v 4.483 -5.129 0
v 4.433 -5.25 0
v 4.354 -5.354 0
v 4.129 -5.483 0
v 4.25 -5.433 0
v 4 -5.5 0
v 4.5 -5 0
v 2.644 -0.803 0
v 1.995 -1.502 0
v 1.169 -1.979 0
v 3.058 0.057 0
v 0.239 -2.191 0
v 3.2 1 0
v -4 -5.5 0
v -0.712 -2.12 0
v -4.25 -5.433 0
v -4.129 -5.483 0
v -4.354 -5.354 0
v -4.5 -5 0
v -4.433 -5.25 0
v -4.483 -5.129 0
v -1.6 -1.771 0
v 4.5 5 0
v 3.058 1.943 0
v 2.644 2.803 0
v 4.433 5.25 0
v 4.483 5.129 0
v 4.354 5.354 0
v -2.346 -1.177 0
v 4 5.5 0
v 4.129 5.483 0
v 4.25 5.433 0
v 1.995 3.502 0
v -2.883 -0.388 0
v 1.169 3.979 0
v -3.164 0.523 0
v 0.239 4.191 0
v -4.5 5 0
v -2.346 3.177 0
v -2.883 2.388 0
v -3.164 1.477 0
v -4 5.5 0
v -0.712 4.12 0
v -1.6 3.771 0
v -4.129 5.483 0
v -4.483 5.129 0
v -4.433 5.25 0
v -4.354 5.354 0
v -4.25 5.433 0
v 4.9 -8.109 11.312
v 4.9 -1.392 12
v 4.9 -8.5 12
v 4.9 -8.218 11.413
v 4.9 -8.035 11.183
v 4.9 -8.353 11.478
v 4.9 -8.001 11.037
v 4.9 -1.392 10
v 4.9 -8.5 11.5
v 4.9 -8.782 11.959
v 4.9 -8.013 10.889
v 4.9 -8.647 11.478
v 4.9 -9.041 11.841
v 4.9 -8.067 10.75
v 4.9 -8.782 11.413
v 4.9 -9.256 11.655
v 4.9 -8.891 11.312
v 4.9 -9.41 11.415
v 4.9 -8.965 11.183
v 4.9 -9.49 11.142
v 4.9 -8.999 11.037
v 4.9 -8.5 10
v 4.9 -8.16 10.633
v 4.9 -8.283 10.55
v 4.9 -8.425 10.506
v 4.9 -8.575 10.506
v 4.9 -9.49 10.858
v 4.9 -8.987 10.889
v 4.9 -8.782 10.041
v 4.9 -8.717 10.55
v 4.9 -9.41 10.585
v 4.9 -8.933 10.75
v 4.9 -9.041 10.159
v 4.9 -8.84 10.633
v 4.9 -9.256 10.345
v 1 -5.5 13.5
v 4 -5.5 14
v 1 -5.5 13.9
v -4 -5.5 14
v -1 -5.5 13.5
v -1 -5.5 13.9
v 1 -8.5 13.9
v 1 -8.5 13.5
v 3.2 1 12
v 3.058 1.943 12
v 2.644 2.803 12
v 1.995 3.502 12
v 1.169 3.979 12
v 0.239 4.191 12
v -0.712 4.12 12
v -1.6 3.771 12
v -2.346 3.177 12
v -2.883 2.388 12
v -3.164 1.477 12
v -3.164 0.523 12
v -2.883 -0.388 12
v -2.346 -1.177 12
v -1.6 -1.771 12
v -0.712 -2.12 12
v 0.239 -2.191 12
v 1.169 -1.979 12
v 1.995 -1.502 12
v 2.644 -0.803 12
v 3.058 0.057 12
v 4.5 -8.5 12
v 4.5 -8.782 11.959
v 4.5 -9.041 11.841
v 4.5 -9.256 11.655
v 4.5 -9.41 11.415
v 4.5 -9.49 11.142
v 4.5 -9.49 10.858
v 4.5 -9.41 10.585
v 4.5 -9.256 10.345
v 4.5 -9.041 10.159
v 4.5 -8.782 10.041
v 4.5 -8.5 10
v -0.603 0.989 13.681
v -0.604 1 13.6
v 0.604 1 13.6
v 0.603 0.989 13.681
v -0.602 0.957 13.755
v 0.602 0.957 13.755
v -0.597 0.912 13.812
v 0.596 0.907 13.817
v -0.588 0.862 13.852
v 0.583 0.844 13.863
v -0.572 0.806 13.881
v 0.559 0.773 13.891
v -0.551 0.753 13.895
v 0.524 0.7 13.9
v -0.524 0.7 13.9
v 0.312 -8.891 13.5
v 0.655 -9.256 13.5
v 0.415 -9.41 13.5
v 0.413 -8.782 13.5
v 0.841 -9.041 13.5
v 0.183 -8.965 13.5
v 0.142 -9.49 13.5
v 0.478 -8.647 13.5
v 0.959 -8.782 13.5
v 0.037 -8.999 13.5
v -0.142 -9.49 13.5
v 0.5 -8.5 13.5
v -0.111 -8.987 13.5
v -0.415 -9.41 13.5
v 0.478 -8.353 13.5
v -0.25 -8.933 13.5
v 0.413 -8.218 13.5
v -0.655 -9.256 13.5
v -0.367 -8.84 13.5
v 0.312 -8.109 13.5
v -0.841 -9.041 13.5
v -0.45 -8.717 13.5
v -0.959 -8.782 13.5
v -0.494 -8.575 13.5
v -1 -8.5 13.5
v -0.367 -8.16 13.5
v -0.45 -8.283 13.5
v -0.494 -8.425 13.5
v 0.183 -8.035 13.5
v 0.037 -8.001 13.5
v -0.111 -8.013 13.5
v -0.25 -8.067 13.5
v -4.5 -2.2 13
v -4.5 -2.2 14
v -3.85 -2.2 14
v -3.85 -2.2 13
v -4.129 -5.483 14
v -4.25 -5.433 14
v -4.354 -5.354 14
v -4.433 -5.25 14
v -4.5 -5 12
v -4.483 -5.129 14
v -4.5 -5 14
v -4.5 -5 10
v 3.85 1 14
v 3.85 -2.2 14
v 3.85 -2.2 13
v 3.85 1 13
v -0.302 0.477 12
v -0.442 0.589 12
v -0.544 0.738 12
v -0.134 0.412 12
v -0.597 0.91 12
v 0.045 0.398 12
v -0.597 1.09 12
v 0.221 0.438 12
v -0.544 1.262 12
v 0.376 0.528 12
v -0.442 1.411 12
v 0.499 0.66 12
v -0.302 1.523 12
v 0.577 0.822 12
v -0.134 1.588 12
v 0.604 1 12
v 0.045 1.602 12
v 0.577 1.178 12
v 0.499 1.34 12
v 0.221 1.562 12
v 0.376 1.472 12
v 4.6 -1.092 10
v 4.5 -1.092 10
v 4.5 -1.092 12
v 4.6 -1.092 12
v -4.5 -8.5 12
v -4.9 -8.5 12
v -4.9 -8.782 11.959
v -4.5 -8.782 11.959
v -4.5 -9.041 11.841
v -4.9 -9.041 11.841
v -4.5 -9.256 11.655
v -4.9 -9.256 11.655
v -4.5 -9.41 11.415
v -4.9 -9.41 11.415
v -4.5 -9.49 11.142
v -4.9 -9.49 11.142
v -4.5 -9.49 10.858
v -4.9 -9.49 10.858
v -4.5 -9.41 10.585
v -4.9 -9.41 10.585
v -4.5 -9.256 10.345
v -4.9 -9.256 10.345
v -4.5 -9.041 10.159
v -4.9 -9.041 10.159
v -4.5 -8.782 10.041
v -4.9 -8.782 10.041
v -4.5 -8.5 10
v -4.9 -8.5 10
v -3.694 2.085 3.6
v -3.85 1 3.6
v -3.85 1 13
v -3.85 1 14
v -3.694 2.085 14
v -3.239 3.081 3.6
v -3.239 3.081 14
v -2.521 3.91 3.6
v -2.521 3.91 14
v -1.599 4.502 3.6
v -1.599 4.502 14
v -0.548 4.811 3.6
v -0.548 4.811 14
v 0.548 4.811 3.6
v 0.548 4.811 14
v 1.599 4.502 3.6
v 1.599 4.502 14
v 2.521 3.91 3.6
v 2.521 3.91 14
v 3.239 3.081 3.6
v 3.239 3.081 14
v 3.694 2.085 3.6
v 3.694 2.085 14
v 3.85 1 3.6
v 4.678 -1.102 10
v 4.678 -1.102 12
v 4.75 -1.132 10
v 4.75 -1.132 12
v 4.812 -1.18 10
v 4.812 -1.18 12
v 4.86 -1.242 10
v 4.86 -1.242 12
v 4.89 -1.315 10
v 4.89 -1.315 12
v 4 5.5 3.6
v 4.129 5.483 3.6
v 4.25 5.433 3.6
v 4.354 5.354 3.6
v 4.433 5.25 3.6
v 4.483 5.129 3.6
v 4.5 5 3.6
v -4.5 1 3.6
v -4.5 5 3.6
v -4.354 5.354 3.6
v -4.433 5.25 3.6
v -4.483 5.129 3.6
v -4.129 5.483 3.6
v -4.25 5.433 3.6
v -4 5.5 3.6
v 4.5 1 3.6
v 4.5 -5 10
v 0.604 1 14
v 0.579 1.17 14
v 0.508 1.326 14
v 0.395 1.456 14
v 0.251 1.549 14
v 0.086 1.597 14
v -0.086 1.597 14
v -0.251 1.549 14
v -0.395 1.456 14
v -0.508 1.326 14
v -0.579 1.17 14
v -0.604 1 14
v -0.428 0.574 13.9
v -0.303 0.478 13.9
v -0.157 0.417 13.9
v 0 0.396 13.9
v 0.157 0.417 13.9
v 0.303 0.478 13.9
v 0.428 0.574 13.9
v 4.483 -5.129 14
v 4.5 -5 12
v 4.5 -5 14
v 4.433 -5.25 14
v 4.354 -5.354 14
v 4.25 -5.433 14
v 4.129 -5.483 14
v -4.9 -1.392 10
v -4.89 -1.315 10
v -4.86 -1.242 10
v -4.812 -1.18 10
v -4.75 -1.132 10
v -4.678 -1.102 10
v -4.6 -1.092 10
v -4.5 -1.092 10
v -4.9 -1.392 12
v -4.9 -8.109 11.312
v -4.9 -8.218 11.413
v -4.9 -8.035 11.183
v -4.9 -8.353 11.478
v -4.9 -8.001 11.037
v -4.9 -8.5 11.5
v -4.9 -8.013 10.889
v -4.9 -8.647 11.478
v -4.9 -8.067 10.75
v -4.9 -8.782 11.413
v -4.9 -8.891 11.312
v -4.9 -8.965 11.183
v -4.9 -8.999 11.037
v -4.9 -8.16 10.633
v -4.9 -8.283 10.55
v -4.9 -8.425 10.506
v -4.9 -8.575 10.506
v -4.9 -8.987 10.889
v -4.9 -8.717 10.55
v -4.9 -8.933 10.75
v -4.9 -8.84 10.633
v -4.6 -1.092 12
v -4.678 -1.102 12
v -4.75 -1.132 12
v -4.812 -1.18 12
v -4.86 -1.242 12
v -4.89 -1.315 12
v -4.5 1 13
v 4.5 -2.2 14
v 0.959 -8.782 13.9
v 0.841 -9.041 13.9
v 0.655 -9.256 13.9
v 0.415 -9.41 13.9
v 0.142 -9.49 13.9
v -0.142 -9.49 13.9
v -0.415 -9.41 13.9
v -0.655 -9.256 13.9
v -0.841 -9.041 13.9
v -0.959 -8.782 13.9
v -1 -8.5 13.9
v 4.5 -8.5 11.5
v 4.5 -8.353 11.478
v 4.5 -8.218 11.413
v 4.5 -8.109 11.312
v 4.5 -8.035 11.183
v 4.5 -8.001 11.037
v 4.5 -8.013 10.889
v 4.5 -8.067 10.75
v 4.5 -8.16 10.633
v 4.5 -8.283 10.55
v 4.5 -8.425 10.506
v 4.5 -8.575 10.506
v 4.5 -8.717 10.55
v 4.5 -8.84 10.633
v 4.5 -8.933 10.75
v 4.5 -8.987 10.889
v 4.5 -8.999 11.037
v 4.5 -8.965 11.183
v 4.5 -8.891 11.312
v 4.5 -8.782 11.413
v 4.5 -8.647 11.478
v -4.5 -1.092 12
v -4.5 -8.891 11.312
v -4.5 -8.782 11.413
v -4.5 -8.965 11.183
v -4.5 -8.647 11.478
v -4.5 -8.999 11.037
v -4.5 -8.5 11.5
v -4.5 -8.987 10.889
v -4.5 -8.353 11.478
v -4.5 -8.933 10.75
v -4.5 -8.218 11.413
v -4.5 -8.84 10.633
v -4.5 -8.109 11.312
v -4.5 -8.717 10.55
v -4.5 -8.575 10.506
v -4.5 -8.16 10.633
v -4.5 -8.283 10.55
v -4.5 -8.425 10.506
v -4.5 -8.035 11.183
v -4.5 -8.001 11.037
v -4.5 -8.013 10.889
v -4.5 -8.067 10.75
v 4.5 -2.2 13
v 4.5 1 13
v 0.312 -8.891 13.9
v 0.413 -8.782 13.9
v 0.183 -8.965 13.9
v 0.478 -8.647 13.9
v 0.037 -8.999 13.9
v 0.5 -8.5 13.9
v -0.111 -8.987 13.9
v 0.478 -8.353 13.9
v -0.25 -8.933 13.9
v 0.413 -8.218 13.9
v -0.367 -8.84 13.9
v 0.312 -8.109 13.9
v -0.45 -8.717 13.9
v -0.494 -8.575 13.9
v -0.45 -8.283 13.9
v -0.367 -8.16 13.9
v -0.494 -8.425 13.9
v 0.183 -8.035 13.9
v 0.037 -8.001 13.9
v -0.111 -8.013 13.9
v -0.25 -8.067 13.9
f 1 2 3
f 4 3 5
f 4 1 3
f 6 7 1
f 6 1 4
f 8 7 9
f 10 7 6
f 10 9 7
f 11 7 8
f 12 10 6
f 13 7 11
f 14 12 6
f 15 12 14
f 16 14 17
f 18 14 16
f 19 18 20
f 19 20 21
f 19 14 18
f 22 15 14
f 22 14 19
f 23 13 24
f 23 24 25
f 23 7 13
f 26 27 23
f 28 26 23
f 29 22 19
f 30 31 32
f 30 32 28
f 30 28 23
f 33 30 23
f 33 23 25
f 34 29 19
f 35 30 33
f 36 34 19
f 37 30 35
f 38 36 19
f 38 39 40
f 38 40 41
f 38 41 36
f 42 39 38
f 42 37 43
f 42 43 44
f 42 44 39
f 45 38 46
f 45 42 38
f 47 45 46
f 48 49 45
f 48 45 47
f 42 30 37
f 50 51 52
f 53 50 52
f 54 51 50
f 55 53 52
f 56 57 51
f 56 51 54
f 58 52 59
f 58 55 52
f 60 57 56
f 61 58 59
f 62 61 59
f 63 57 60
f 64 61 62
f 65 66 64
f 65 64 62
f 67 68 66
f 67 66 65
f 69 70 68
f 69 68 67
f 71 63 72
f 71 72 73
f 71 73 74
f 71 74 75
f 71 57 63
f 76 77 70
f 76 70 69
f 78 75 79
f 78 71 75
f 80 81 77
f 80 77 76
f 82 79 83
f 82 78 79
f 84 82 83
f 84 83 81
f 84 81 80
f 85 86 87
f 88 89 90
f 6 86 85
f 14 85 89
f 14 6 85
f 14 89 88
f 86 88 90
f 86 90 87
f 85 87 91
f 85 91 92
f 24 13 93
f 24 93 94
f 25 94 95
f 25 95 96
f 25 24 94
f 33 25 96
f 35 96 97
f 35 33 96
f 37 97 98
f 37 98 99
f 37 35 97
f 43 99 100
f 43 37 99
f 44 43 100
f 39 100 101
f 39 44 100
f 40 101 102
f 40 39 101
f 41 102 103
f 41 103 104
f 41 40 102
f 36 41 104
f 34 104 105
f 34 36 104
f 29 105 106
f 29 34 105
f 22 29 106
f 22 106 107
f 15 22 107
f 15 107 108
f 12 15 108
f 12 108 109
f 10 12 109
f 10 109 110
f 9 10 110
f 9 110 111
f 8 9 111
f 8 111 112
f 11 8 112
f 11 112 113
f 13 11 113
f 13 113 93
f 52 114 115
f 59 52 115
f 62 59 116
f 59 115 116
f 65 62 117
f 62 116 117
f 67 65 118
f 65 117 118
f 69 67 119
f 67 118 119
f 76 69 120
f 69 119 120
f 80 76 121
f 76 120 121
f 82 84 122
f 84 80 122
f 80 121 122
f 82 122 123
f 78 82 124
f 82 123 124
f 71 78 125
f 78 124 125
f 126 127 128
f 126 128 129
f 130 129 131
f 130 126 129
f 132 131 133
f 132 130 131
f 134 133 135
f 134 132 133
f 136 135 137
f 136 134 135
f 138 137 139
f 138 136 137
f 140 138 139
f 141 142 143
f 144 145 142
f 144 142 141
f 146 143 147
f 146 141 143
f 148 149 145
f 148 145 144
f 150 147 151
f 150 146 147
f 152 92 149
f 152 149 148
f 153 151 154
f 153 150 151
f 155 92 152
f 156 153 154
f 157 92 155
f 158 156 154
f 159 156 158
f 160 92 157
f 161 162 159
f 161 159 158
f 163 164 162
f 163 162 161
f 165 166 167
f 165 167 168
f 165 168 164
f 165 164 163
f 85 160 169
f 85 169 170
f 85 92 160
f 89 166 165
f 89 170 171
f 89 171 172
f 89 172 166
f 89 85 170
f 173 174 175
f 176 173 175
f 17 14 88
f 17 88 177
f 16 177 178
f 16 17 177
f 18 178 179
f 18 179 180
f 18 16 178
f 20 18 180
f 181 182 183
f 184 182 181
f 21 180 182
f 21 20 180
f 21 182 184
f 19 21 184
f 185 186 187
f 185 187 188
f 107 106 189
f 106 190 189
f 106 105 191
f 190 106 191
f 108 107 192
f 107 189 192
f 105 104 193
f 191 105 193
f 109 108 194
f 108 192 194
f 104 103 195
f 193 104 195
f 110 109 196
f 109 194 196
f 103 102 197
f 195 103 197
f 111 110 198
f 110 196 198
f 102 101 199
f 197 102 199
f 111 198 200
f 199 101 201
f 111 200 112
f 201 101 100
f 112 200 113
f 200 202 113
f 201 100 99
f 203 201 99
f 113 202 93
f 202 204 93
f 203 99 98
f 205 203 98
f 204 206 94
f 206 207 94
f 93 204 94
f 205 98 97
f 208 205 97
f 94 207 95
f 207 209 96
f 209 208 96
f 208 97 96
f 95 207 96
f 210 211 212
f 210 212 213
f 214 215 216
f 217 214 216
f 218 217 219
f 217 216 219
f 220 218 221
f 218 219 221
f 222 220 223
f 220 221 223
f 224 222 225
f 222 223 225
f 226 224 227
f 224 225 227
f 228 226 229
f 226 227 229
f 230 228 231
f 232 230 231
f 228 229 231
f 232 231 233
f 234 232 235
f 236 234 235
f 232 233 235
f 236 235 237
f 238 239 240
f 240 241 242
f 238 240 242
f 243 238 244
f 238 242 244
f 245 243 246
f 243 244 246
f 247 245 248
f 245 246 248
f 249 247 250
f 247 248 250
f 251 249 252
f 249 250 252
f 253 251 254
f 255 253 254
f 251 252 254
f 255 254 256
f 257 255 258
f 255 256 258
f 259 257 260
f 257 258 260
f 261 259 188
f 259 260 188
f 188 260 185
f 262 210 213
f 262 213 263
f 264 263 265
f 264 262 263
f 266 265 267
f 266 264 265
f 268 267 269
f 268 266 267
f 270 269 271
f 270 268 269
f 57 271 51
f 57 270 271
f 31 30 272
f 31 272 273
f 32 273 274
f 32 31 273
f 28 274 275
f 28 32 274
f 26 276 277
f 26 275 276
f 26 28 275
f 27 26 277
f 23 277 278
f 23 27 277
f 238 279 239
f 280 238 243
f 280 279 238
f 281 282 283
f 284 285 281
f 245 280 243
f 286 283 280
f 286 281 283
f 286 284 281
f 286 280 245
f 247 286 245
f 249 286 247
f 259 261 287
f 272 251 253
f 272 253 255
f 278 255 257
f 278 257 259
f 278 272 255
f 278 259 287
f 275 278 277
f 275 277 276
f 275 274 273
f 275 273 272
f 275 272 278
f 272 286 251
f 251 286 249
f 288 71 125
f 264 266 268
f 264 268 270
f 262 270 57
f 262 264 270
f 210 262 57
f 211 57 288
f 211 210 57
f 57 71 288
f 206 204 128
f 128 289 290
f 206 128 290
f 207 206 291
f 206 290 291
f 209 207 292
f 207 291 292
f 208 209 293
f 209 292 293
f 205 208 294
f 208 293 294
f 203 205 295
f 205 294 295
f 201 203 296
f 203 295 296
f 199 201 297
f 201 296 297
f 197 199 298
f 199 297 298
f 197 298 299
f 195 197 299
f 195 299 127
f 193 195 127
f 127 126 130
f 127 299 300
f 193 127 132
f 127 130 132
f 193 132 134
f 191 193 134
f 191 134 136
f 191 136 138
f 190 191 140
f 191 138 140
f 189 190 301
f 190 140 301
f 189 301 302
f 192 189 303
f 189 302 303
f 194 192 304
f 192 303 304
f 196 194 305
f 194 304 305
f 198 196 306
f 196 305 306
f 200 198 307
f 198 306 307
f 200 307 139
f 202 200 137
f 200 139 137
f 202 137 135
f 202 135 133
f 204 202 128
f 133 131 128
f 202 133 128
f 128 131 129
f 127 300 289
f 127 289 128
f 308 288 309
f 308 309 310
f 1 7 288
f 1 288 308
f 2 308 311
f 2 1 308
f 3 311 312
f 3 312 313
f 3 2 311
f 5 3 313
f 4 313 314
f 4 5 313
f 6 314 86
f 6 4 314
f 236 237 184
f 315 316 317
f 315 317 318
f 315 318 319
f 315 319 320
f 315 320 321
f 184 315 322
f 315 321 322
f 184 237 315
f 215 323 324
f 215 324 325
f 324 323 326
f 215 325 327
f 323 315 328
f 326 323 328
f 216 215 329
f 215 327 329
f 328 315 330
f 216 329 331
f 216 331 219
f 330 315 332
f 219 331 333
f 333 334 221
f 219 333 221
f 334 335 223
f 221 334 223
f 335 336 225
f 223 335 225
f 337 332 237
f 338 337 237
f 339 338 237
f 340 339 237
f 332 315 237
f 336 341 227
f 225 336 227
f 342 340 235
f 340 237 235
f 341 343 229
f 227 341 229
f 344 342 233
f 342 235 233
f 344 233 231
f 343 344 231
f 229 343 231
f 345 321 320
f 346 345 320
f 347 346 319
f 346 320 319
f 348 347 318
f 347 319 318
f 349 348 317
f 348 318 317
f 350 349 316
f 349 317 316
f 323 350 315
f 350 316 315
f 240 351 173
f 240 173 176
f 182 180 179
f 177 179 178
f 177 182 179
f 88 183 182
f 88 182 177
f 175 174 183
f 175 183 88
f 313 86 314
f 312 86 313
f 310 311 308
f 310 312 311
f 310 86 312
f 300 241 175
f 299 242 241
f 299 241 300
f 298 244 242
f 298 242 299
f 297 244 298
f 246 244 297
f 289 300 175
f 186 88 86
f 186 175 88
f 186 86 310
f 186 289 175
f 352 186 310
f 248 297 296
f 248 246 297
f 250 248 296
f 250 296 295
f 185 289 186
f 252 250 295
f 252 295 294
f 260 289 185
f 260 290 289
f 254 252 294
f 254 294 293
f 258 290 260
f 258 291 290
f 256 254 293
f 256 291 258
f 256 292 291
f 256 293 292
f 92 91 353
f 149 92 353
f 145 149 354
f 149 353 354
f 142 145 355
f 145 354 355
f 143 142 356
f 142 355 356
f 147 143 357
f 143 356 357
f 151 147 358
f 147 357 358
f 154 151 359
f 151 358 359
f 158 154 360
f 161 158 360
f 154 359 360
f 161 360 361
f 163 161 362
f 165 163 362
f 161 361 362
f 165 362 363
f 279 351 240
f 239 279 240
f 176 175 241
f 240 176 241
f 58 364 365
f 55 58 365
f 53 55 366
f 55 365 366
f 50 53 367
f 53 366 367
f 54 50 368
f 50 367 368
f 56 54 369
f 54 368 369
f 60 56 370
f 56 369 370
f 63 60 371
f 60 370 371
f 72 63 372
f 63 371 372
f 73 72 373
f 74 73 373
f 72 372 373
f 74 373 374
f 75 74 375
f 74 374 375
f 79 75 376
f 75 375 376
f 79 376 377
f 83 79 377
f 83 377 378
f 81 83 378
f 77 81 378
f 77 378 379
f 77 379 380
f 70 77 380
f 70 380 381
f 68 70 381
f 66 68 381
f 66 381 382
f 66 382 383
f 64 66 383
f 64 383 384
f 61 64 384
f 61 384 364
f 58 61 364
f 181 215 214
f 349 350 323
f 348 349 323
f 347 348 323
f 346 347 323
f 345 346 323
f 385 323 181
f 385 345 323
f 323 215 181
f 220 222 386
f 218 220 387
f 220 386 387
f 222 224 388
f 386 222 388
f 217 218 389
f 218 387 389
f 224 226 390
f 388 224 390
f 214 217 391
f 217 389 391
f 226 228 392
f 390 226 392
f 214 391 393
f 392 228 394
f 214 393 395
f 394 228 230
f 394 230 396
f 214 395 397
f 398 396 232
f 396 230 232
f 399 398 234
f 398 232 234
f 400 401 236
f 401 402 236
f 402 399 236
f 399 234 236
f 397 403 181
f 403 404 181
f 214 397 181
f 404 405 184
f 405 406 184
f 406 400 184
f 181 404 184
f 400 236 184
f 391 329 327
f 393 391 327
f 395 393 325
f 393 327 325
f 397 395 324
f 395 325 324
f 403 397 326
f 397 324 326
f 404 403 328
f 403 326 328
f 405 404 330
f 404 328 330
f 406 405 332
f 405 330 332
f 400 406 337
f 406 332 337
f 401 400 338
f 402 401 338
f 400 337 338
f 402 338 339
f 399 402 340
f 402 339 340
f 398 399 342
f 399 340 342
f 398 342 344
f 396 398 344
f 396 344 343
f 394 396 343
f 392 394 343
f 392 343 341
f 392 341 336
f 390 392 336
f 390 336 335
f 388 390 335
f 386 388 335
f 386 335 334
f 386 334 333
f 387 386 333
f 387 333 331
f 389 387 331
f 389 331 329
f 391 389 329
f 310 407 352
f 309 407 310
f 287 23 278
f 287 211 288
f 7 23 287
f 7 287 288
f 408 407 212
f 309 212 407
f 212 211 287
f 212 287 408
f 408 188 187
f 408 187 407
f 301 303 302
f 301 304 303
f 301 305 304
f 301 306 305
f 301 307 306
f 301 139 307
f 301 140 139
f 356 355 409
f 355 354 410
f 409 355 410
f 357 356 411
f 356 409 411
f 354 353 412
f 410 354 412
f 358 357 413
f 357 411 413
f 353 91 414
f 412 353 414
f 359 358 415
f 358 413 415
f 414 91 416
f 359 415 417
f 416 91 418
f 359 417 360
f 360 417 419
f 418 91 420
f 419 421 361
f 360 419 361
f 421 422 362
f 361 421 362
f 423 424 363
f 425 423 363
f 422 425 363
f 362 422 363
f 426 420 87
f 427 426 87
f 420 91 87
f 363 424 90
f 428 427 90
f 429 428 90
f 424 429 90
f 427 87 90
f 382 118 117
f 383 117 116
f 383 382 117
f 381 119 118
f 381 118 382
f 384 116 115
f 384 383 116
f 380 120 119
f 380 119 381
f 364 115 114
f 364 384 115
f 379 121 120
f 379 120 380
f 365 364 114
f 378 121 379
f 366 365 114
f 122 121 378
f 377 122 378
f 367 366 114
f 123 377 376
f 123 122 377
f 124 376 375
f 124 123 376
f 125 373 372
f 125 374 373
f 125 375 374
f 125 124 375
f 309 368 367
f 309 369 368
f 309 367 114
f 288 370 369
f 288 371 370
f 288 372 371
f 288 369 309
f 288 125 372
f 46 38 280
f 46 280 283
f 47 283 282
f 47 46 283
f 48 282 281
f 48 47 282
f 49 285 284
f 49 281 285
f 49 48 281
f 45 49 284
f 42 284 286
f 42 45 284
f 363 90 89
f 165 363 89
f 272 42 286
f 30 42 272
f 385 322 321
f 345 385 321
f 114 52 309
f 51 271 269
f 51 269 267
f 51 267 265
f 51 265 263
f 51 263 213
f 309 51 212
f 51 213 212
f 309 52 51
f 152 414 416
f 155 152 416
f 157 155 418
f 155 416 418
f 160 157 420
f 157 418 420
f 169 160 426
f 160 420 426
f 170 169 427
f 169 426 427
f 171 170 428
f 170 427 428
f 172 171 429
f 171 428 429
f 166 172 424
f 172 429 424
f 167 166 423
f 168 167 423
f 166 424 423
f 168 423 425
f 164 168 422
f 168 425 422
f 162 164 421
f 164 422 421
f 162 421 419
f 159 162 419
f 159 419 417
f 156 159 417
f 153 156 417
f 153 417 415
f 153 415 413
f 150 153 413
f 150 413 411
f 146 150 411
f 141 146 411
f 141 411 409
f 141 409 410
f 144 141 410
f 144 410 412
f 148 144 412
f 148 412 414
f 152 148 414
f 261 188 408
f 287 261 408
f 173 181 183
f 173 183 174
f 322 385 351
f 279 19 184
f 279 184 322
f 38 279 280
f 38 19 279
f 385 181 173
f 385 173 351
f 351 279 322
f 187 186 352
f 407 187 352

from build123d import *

# Parameters (mm, degrees)
SKETCH_1_R               = 3.2
EXTRUDE_1_DEPTH          = 14
CUT_EXTRUDE_1_DEPTH      = 1
CUT_EXTRUDE_1_DEPTH_BACK = 10.4
SKETCH_3_W               = 0.65
SKETCH_3_H               = 3.2
CUT_EXTRUDE_2_DEPTH      = 1
SKETCH_4_W               = 0.4
SKETCH_4_H               = 2
EXTRUDE_2_DEPTH          = 4
EXTRUDE_2_2_DEPTH        = 4
SKETCH_4_W_2             = 2
SKETCH_4_H_2             = 0.4
EXTRUDE_2_3_DEPTH        = 4
EXTRUDE_3_DEPTH          = 2
EXTRUDE_4_DEPTH          = 2
SKETCH_8_R               = 3.2
SKETCH_8_R_2             = 0.603563731
EXTRUDE_5_DEPTH          = 2
SKETCH_9_R               = 0.5
CUT_EXTRUDE_3_DEPTH      = 10.8
SKETCH_10_R              = 0.5
CUT_EXTRUDE_4_DEPTH      = 2


with BuildPart() as part:
    # 草图1 → 凸台-拉伸1 (new body)
    with BuildSketch(Plane.XY):
        with BuildLine():
            Line((-4, 5.5), (4, 5.5))
            ThreePointArc((4, 5.5), (4.353553391, 5.353553391), (4.5, 5))
            Line((4.5, 5), (4.5, -5))
            ThreePointArc((4.5, -5), (4.353553391, -5.353553391), (4, -5.5))
            Line((4, -5.5), (-4, -5.5))
            ThreePointArc((-4, -5.5), (-4.353553391, -5.353553391), (-4.5, -5))
            Line((-4.5, -5), (-4.5, 5))
            ThreePointArc((-4.5, 5), (-4.353553391, 5.353553391), (-4, 5.5))
        make_face()
        with Locations((0, 1)):
            Circle(SKETCH_1_R, mode=Mode.SUBTRACT)
    extrude(amount=EXTRUDE_1_DEPTH)

    # 草图2 → 切除-拉伸1 (cut, two sides)
    with BuildSketch(Plane.XY.offset(14)) as cut_extrude_1_sk:
        with BuildLine():
            ThreePointArc((-3.85, 1), (0, 4.85), (3.85, 1))
            Line((3.85, 1), (4.5, 1))
            Line((4.5, 1), (4.5, 5))
            ThreePointArc((4.5, 5), (4.353553391, 5.353553391), (4, 5.5))
            Line((4, 5.5), (-4, 5.5))
            ThreePointArc((-4, 5.5), (-4.353553391, 5.353553391), (-4.5, 5))
            Line((-4.5, 5), (-4.5, 1))
            Line((-4.5, 1), (-3.85, 1))
        make_face()
    extrude(amount=CUT_EXTRUDE_1_DEPTH, mode=Mode.SUBTRACT)
    extrude(cut_extrude_1_sk.sketch, amount=-CUT_EXTRUDE_1_DEPTH_BACK, mode=Mode.SUBTRACT)

    # 草图3 → 切除-拉伸2 (cut)
    with BuildSketch(Plane.XY.offset(14)):
        with Locations((-4.175, -0.6)):
            Rectangle(SKETCH_3_W, SKETCH_3_H)
        with Locations((4.175, -0.6)):
            Rectangle(SKETCH_3_W, SKETCH_3_H)
    extrude(amount=-CUT_EXTRUDE_2_DEPTH, mode=Mode.SUBTRACT)



with BuildPart() as body_2:
    # 草图4 → 凸台-拉伸2 (new body)
    with BuildSketch(Plane(origin=(0, -5.5, 0), x_dir=(-1, 0, 0), z_dir=(0, -1, 0))):
        with Locations((4.7, -11)):
            Rectangle(SKETCH_4_W, SKETCH_4_H)
    extrude(amount=EXTRUDE_2_DEPTH)


with BuildPart() as body_3:
    # 草图4 → Extrude 2 2 (new body)
    with BuildSketch(Plane(origin=(0, -5.5, 0), x_dir=(-1, 0, 0), z_dir=(0, -1, 0))):
        with Locations((-4.7, -11)):
            Rectangle(SKETCH_4_W, SKETCH_4_H)
    extrude(amount=EXTRUDE_2_2_DEPTH)


with BuildPart() as body_4:
    # 草图4 → Extrude 2 3 (new body)
    with BuildSketch(Plane(origin=(0, -5.5, 0), x_dir=(-1, 0, 0), z_dir=(0, -1, 0))):
        with Locations((0, -13.7)):
            Rectangle(SKETCH_4_W_2, SKETCH_4_H_2)
    extrude(amount=EXTRUDE_2_3_DEPTH)


with BuildPart() as part_1:
    add(part.part)

    add(body_2.part)  # 凸台-拉伸3 merges body 2

    add(body_3.part)  # 凸台-拉伸3 merges body 3
    # 草图5 → 凸台-拉伸3 (add)
    with BuildSketch(Plane(origin=(0, 0, 10), x_dir=(-1, 0, 0), z_dir=(0, 0, -1))):
        with BuildLine():
            Line((4.5, -5.5), (4.5, -1.092241159))
            Line((4.5, -1.092241159), (4.6, -1.092241159))
            ThreePointArc((4.6, -1.092241159), (4.812132034, -1.180109124), (4.9, -1.392241159))
            Line((4.9, -1.392241159), (4.9, -5.5))
            Line((4.9, -5.5), (4.5, -5.5))
        make_face()
        with BuildLine():
            Line((-4.9, -1.392241159), (-4.9, -5.5))
            Line((-4.9, -5.5), (-4.5, -5.5))
            Line((-4.5, -5.5), (-4.5, -1.092241159))
            Line((-4.5, -1.092241159), (-4.6, -1.092241159))
            ThreePointArc((-4.6, -1.092241159), (-4.812132034, -1.180109124), (-4.9, -1.392241159))
        make_face()
    extrude(amount=-EXTRUDE_3_DEPTH)


    add(body_4.part)  # 凸台-拉伸4 merges body 4
    # 草图7 → 凸台-拉伸4 (add)
    with BuildSketch(Plane.ZY.offset(1)):
        with BuildLine():
            Line((14, -5.5), (14, 1))
            Line((14, 1), (13.6, 1))
            ThreePointArc((13.6, 1), (13.812132034, 0.912132034), (13.9, 0.7))
            Line((13.9, 0.7), (13.9, -5.5))
            Line((13.9, -5.5), (14, -5.5))
        make_face()
    extrude(amount=-EXTRUDE_4_DEPTH)

    # 草图8 → 凸台-拉伸5 (add)
    with BuildSketch(Plane.XY.offset(14)):
        with Locations((0, 1)):
            Circle(SKETCH_8_R)
        with Locations((0, 1)):
            Circle(SKETCH_8_R_2, mode=Mode.SUBTRACT)
    extrude(amount=-EXTRUDE_5_DEPTH)

    # 草图9 → 切除-拉伸3 (cut, through all)
    with BuildSketch(Plane.ZY.offset(4.9)):
        with Locations((11, -8.5)):
            Circle(SKETCH_9_R)
        with BuildLine():
            Line((10, -8.5), (10, -9.805302044))
            Line((10, -9.805302044), (12, -9.805302044))
            Line((12, -9.805302044), (12, -8.5))
            ThreePointArc((12, -8.5), (11, -9.5), (10, -8.5))
        make_face()
    extrude(amount=-CUT_EXTRUDE_3_DEPTH, mode=Mode.SUBTRACT)

    # 草图10 → 切除-拉伸4 (cut)
    with BuildSketch(Plane.XY.offset(13.9)):
        with Locations((0, -8.5)):
            Circle(SKETCH_10_R)
        with BuildLine():
            Line((-1, -8.5), (-1, -10.359825608))
            Line((-1, -10.359825608), (1, -10.359825608))
            Line((1, -10.359825608), (1, -8.5))
            ThreePointArc((1, -8.5), (0, -9.5), (-1, -8.5))
        make_face()
    extrude(amount=-CUT_EXTRUDE_4_DEPTH, mode=Mode.SUBTRACT)


solid = part_1.part
